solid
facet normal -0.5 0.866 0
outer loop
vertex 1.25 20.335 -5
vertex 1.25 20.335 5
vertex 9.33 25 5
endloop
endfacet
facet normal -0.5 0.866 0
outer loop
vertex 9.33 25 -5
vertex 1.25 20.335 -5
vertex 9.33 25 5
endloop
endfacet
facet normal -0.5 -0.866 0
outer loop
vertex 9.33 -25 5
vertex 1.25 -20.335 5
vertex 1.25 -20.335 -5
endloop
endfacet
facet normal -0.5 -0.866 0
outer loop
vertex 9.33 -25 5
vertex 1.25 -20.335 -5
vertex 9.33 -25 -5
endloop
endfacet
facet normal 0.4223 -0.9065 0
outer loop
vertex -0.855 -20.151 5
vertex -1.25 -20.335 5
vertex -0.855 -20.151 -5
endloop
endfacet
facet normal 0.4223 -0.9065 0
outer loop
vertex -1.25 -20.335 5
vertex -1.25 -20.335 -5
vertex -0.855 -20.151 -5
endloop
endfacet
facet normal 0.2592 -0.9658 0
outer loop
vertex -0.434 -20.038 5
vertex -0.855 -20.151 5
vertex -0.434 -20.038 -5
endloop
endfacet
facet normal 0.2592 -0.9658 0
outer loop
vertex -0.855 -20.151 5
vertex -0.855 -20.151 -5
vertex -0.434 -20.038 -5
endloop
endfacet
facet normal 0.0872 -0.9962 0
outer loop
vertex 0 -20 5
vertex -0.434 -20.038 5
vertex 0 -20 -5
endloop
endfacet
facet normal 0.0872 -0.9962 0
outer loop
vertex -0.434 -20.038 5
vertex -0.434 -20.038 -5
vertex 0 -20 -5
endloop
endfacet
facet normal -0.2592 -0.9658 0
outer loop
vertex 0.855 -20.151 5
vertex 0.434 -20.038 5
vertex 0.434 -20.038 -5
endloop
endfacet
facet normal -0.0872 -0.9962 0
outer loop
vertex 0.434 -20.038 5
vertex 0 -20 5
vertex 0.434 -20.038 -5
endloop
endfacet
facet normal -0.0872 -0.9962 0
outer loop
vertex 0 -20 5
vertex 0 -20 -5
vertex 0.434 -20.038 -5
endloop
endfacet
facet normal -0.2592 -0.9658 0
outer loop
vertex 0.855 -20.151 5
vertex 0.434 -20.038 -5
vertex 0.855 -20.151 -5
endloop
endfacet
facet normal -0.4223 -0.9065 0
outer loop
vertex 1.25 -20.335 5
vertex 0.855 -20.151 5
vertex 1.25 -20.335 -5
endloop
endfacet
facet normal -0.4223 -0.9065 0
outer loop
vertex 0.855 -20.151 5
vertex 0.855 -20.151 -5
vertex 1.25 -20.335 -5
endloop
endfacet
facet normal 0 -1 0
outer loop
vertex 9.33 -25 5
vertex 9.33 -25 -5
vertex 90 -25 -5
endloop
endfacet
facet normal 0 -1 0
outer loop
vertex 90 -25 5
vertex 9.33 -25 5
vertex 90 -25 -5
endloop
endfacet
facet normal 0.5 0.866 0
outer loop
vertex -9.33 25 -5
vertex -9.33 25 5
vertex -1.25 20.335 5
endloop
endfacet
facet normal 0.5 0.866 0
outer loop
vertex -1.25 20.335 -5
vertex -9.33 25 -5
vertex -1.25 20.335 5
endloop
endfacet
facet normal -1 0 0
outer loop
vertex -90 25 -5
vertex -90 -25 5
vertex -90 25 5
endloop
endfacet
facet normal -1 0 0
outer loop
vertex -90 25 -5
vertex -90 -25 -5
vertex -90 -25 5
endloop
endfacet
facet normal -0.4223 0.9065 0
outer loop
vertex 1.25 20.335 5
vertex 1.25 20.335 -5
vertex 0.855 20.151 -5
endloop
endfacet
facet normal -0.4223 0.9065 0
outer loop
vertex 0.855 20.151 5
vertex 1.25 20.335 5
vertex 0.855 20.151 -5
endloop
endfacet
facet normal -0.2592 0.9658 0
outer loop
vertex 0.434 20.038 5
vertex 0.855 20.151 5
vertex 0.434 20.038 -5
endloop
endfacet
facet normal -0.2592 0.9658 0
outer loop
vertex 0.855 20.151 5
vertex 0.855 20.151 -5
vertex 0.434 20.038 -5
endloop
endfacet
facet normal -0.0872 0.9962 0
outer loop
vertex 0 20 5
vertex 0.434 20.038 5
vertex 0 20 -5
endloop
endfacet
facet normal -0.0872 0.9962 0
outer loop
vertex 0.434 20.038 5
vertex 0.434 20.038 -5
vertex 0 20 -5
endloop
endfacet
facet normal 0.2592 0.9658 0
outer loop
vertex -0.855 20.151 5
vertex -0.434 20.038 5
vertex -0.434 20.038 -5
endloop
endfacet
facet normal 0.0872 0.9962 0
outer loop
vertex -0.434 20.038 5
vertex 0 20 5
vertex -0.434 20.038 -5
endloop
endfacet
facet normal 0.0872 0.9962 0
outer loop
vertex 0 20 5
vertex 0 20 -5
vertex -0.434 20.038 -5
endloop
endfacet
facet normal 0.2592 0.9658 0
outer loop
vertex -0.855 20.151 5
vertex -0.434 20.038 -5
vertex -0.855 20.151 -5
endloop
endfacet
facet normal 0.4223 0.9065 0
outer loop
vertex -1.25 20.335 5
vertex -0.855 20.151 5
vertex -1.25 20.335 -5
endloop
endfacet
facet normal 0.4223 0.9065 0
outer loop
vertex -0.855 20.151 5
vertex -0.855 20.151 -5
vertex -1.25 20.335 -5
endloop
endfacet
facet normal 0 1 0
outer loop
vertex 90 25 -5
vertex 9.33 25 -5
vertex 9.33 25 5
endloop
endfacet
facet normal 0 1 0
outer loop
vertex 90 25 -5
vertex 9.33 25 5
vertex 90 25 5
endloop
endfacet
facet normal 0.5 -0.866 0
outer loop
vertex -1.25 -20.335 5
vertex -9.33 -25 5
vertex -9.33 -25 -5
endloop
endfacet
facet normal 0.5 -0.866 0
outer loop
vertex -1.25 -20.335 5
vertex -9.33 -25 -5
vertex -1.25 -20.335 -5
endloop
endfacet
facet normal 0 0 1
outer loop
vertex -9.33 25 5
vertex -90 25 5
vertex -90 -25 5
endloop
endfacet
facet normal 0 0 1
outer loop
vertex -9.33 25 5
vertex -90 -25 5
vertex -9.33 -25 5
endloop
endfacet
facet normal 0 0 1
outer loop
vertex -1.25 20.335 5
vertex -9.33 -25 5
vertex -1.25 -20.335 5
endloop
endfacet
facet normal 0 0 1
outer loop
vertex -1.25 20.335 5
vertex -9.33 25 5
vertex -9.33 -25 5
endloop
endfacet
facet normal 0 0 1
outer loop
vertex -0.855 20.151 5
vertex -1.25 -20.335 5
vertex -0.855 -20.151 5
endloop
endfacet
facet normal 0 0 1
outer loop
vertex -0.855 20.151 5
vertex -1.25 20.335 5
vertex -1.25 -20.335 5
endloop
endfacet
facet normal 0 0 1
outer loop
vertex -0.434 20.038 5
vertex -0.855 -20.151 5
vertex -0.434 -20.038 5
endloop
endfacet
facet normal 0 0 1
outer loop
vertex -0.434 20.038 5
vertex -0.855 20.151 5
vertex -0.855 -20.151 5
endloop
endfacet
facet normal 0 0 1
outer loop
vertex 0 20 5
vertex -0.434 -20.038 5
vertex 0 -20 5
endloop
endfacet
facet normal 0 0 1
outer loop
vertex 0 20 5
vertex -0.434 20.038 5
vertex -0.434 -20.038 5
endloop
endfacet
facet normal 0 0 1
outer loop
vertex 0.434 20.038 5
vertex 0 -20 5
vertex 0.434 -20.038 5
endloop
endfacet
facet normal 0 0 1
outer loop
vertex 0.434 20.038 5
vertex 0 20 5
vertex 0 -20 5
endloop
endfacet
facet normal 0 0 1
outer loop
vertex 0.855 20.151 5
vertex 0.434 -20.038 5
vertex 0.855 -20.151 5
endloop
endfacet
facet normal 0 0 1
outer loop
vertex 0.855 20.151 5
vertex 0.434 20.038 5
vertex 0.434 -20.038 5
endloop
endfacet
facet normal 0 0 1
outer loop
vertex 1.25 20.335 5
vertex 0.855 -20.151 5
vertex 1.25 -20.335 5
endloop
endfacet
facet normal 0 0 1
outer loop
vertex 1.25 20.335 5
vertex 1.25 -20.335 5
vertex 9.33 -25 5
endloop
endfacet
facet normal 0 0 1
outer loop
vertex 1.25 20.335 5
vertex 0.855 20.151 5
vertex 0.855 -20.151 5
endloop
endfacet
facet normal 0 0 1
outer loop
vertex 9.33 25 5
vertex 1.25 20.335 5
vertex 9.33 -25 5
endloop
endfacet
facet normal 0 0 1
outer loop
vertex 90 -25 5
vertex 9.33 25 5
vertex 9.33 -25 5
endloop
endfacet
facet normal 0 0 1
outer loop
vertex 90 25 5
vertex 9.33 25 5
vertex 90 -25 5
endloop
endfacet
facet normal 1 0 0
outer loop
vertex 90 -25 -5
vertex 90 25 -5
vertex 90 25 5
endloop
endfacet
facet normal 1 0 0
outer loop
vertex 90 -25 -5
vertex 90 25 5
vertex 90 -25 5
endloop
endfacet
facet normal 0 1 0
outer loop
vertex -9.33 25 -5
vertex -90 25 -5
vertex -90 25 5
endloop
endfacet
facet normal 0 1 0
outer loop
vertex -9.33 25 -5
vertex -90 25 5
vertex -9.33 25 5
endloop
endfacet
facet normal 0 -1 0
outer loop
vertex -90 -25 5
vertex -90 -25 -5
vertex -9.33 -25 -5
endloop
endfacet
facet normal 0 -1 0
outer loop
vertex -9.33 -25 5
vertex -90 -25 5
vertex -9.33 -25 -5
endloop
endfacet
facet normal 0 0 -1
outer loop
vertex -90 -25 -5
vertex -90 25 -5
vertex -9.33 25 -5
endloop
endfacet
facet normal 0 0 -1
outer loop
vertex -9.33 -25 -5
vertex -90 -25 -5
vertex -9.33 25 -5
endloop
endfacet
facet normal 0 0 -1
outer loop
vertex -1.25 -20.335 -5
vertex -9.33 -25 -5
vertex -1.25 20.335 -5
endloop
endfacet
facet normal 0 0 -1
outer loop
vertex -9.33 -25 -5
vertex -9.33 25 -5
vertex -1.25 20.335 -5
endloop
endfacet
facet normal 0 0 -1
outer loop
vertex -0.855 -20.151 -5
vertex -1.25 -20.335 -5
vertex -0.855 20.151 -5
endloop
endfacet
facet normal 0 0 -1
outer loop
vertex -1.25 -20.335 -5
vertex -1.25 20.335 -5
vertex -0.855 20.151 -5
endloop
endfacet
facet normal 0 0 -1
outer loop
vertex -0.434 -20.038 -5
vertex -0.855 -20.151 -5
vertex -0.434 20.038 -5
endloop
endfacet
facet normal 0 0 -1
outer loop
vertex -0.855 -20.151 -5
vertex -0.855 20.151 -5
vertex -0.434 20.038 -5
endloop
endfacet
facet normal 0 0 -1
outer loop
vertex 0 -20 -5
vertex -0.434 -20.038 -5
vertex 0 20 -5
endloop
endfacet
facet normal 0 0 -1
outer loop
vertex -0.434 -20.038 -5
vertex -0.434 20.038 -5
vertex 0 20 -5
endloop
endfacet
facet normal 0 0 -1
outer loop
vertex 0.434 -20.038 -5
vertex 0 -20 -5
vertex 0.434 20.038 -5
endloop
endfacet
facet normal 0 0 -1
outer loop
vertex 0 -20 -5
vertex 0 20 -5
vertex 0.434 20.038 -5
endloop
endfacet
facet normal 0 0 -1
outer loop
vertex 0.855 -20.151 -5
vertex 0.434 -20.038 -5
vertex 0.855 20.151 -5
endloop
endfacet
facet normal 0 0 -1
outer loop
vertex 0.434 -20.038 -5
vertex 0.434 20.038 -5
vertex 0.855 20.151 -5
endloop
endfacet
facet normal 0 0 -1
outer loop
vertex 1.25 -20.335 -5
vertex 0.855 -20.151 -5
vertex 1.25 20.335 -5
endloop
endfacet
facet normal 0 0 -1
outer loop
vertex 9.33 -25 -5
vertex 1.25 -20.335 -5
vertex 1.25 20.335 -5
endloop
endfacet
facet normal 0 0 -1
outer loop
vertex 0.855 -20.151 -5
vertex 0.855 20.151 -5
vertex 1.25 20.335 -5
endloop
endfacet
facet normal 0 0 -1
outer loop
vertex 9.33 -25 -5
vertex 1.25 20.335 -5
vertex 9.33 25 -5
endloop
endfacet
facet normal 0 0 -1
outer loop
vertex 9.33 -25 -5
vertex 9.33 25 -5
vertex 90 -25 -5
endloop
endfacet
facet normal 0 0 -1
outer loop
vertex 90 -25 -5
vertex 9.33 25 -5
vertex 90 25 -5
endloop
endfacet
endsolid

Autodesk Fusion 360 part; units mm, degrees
sketch "Sketch1" plane through (0, 0, 0) normal (0, 0, 1) x (1, 0, 0)
  line L0 (-90, 0) -> (-90, 25)
  line L1 (-90, 25) -> (-9.3301, 25)
  line L2 (-9.3301, 25) -> (-1.25, 20.3349)
  arc A0 (-1.25, 20.3349) -> (1.25, 20.3349) centre (0, 22.5) ccw
  line L3 (1.25, 20.3349) -> (9.3301, 25)
  line L4 (9.3301, 25) -> (90, 25)
  line L5 (90, 25) -> (90, 0)
  line L6 (-90, 0) -> (90, 0) construction
  line L7 (0, 0) -> (0, 22.5) construction
  line L8 (-90, 0) -> (-90, -25)
  line L9 (-90, -25) -> (-9.3301, -25)
  line L10 (-9.3301, -25) -> (-1.25, -20.3349)
  line L11 (1.25, -20.3349) -> (9.3301, -25)
  line L12 (9.3301, -25) -> (90, -25)
  line L13 (90, -25) -> (90, 0)
  arc A1 (1.25, -20.3349) -> (-1.25, -20.3349) centre (0, -22.5) ccw
  line L14 (-90, 20) -> (90, 20) construction
  dimension "Total_Width" = 180
  dimension "Notch_Radius" = 2.5
  dimension "Notch_Theta" = 120
  dimension "Total_Height" = 50
  dimension "Notch_Height" = 5
extrude "Extrude1" add sketch "Sketch1" along normal mid plane 10
equation "Thickness = 1 cm"
